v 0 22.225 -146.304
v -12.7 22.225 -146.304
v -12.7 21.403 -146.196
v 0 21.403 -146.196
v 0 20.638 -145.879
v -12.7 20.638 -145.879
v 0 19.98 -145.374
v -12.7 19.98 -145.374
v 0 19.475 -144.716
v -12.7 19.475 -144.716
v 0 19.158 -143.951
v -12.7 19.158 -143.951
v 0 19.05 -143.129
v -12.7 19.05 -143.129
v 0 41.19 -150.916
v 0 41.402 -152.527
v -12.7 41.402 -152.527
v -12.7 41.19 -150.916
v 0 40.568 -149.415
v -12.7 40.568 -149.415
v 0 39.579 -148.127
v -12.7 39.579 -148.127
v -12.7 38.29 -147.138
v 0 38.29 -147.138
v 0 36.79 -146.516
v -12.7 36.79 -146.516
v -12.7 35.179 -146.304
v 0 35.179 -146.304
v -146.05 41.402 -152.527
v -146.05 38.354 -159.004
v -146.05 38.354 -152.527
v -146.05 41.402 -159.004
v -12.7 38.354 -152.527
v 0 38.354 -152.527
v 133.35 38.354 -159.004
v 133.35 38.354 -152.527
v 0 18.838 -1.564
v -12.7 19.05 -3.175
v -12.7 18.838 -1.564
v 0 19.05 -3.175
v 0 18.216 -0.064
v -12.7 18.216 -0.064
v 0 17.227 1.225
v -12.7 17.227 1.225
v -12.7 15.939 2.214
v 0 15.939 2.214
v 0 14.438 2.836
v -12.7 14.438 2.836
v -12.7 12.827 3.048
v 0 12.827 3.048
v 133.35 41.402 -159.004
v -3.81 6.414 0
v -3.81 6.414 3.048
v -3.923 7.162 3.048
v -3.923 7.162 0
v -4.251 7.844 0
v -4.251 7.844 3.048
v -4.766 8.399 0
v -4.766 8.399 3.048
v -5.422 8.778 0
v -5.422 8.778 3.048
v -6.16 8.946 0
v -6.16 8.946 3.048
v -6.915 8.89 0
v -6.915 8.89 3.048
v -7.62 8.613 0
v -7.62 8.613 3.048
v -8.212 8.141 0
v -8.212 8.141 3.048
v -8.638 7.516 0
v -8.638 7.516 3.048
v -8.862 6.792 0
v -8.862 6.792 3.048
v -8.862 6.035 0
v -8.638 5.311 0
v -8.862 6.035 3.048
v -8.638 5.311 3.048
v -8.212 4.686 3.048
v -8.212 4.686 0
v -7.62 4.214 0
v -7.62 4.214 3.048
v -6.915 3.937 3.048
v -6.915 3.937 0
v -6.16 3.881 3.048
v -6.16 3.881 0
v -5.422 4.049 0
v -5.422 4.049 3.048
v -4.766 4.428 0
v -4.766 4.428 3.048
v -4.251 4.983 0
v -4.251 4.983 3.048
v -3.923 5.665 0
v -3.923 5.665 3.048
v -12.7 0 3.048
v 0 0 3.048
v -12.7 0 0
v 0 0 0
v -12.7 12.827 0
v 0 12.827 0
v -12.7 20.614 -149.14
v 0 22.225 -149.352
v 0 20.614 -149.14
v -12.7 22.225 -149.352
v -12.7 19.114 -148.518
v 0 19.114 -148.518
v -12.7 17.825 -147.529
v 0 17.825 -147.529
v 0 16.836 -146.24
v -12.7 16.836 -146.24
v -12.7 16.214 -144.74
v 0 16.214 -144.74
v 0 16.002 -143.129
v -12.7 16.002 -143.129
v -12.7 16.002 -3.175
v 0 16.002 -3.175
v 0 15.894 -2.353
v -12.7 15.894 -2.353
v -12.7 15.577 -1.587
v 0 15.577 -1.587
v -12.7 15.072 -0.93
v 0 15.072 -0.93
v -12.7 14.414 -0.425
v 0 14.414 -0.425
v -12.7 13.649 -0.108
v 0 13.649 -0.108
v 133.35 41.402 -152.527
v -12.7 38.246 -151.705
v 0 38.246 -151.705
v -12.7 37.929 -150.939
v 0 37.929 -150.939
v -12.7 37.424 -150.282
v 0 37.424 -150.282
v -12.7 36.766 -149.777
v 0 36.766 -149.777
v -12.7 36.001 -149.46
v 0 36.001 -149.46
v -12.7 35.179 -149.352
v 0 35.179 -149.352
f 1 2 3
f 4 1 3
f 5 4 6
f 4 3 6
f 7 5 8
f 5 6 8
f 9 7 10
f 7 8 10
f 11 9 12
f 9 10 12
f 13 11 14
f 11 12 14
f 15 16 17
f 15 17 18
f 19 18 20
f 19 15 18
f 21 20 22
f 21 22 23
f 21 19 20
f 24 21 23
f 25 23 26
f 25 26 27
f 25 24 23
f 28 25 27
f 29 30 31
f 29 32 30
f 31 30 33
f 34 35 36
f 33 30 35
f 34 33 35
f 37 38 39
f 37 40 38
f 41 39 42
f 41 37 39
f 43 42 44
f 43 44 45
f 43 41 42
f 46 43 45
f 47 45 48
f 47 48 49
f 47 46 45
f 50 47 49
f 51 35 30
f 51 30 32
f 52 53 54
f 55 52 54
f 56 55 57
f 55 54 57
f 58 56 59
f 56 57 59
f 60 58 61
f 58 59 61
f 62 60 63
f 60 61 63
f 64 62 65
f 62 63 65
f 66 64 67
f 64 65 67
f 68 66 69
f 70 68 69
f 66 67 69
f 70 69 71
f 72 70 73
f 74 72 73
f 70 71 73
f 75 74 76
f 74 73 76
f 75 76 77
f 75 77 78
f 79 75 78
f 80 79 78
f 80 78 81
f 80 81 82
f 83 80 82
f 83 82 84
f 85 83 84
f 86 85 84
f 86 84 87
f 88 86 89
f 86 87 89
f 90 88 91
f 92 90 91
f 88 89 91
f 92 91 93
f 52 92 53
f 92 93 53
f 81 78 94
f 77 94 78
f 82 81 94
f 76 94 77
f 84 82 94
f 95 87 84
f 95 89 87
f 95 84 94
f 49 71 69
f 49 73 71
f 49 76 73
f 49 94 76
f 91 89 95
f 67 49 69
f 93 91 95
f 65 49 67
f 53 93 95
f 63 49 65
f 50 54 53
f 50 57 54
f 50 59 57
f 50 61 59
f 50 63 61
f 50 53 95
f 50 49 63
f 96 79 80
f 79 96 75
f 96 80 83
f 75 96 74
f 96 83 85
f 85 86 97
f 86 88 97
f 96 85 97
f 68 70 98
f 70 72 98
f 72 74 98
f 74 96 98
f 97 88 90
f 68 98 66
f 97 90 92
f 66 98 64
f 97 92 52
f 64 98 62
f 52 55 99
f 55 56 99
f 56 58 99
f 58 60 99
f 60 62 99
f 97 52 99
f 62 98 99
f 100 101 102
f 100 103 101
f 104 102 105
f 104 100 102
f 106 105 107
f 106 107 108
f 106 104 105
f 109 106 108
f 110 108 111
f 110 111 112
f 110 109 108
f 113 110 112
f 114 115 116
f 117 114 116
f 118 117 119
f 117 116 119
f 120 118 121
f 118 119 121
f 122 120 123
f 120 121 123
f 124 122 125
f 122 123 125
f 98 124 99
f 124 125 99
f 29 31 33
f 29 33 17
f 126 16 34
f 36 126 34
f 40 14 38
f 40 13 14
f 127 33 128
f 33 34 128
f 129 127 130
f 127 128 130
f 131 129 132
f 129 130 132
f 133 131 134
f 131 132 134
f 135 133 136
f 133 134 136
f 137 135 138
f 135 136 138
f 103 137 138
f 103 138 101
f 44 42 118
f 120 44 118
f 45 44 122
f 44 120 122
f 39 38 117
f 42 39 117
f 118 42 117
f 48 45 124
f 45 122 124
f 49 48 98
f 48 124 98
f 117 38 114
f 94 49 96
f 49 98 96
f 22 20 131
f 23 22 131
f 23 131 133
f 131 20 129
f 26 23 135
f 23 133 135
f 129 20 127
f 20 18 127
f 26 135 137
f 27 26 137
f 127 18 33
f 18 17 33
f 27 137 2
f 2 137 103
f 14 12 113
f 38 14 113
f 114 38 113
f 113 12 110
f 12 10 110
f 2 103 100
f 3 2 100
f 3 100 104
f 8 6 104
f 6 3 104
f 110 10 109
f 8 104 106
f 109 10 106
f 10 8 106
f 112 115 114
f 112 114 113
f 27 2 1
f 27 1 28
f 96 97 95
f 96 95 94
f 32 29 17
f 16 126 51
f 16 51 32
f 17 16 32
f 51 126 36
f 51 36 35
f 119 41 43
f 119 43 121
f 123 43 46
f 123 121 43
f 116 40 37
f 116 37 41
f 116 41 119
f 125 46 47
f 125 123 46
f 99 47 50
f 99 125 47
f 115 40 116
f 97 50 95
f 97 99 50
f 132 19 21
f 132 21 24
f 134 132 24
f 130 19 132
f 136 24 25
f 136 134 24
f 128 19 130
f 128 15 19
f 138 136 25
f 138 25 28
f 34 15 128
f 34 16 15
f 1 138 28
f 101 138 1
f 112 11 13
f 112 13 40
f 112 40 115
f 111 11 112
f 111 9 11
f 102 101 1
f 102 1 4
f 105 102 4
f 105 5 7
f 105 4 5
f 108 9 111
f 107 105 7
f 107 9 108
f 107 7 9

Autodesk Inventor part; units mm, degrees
ref_plane "YZ Plane" through (0, 0, 0) normal (1, 0, 0) x (0, 1, 0)
ref_plane "XZ Plane" through (0, 0, 0) normal (0, 1, 0) x (-1, 0, 0)
ref_plane "XY Plane" through (0, 0, 0) normal (0, 0, 1) x (1, 0, 0)
sketch "Sketch1" plane through (0, 0, 0) normal (0, 0, 1) x (1, 0, 0)
  line L0 (0, 0) -> (-12.7, 0)
  line L1 (-12.7, 0) -> (-12.7, 19.05)
  line L2 (-12.7, 19.05) -> (0, 19.05)
  line L3 (0, 19.05) -> (0, 0)
  dimension "d0" = 12.7
  dimension "d1" = 19.05
extrude "Plate1" add sketch "Sketch1" along normal blind 3.048
sketch "Sketch2" plane through (0, 16.002, 3.048) normal (0, 1, 0) x (-1, 0, 0)
  line L0 (12.7, 0) -> (0, 0)
  line L1 (0, 0) -> (0, -152.4)
  line L2 (0, -152.4) -> (12.7, -152.4)
  line L3 (12.7, -152.4) -> (12.7, 0)
edge flange "Flange1" height 152.4 angle 90 thickness 3.048 bend radius 3.175 thickness toward (0, 1, 0) relief tear relief width 3.048 relief depth 1.524 edges at (-6.35, 19.05, 0) wall of the first edge with corners at (-12.7, 16.002, 3.048) (0, 16.002, 3.048) (0, 16.002, -149.352) (-12.7, 16.002, -149.352)
bend "Bend1"
corner "Corner1"
sketch "Sketch3" plane through (0, 0, 3.048) normal (0, 0, 1) x (1, 0, 0)
  line L0 (0, 12.827) -> (-12.7, 12.827) projected
  line L1 (0, 12.827) -> (0, 0) projected
  circle A0 centre (-6.35, 6.4135) radius 2.54
  dimension "d13" = 5.08
  dimension "d15" = 6.4135
  dimension "d16" = 6.35
extrude "Cut1" cut sketch "Sketch3" against normal blind 3.048
sketch "Sketch4" plane through (-12.7, 16.002, -146.304) normal (0, 0, -1) x (-1, 0, 0)
  line L0 (-12.7, 0) -> (0, 0)
  line L1 (0, 0) -> (0, 25.4)
  line L2 (0, 25.4) -> (-12.7, 25.4)
  line L3 (-12.7, 25.4) -> (-12.7, 0)
edge flange "Flange2" height 25.4 angle 90 thickness 3.048 bend radius 3.175 thickness toward (0, 0, -1) relief tear relief width 3.048 relief depth 1.524 edges at (-6.35, 19.05, -149.352) wall of the first edge with corners at (0, 16.002, -146.304) (-12.7, 16.002, -146.304) (-12.7, 41.402, -146.304) (0, 41.402, -146.304)
bend "Bend2"
corner "Corner2"
sketch "Sketch5" plane through (0, 38.354, -146.304) normal (0, 1, 0) x (-1, 0, 0)
  line L0 (12.7, 0) -> (0, 0)
  line L1 (0, 0) -> (0, -12.7)
  line L2 (0, -12.7) -> (12.7, -12.7)
  line L3 (12.7, -12.7) -> (12.7, 0)
edge flange "Flange3" height 12.7 angle 90 thickness 3.048 bend radius 3.175 thickness toward (0, 1, 0) relief tear relief width 3.048 relief depth 1.524 edges at (-6.35, 41.402, -149.352) wall of the first edge with corners at (-12.7, 38.354, -146.304) (0, 38.354, -146.304) (0, 38.354, -159.004) (-12.7, 38.354, -159.004)
bend "Bend3"
corner "Corner3"
sketch "Sketch6" plane through (0, 38.354, -159.004) normal (1, 0, 0) x (0, 0, -1)
  line L0 (-6.477, 3.048) -> (-6.477, 0) projected
  line L1 (0, 0) -> (-6.477, 0) projected
  line L2 (0, 0) -> (0, 3.048) projected
  line L3 (0, 3.048) -> (-6.477, 3.048) projected
  point P0 (-159.004, -38.354)
extrude "Extrusion1" add sketch "Sketch6" along normal blind 133.35
sketch "Sketch7" plane through (-12.7, 38.354, -159.004) normal (-1, 0, 0) x (0, 0, 1)
  line L0 (6.477, 0) -> (6.477, 3.048) projected
  line L1 (6.477, 3.048) -> (0, 3.048) projected
  line L2 (0, 0) -> (0, 3.048) projected
  line L3 (0, 0) -> (6.477, 0) projected
  point P0 (159.004, -38.354)
extrude "Extrusion2" add sketch "Sketch7" along normal blind 133.35
sketch "Sketch8" plane through (0, 16.002, -3.175) normal (1, 0, 0) x (0, 0, -1)
  line L0 (139.954, 0) -> (139.954, 3.048) projected
  line L1 (139.954, 3.048) -> (0, 3.048) projected
  line L2 (0, 3.048) -> (0, 0) projected
  line L3 (139.954, 0) -> (0, 0) projected
  line L4 (12.7, 3.048) -> (25.4, 3.048)
  line L5 (25.4, 3.048) -> (25.4, 0)
  line L6 (25.4, 0) -> (12.7, 0)
  line L7 (12.7, 3.048) -> (12.7, 0)
  point P0 (-3.175, -16.002)
  dimension "d43" = 12.7
  dimension "d44" = 12.7
sketch "Sketch9" plane through (0, 38.354, -152.527) normal (0, 0, 1) x (1, 0, 0)
  line L0 (0, 3.048) -> (0, 0) projected
  line L1 (0, 0) -> (133.35, 0) projected
  line L2 (133.35, 3.048) -> (133.35, 0) projected
  line L3 (0, 3.048) -> (133.35, 3.048) projected
  line L4 (133.35, 0) -> (120.65, 0)
  line L5 (120.65, 0) -> (120.65, 3.048)
  line L6 (133.35, 3.048) -> (120.65, 3.048)
  line L7 (133.35, 3.048) -> (133.35, 0)
  point P0 (0, -38.354)
  dimension "d45" = 12.7
equation "\"d17\" = Thickness"
equation "\"d3\" = BendReliefWidth"
equation "\"d4\" = BendReliefDepth"
equation "\"d5\" = MinimumRemnant"
equation "\"d6\" = BendRadius"
equation "\"d10\" = CornerReliefSize"
equation "\"d11\" = GapSize"
equation "\"d12\" = JacobiRadiusSize"
equation "\"d19\" = BendReliefWidth"
equation "\"d20\" = BendReliefDepth"
equation "\"d21\" = MinimumRemnant"
equation "\"d22\" = BendRadius"
equation "\"d26\" = CornerReliefSize"
equation "\"d27\" = GapSize"
equation "\"d28\" = JacobiRadiusSize"
equation "\"d29\" = BendReliefWidth"
equation "\"d30\" = BendReliefDepth"
equation "\"d31\" = MinimumRemnant"
equation "\"d32\" = BendRadius"
equation "\"d36\" = CornerReliefSize"
equation "\"d37\" = GapSize"
equation "\"d38\" = JacobiRadiusSize"
equation "\"BendRadius\" = Thickness"
equation "\"BendReliefWidth\" = Thickness"
equation "\"BendReliefDepth\" = 0.5 * Thickness"
equation "\"CornerReliefSize\" = 4 * Thickness"
equation "\"MinimumRemnant\" = 2 * Thickness"
equation "\"TransitionRadius\" = BendRadius"
equation "\"JacobiRadiusSize\" = BendRadius"
equation "\"GapSize\" = Thickness"
equation "\"d2\" = BendRadius"
equation "\"Thickness\" = 3.048"
properties part number "Feeder-Grabber_v1"
